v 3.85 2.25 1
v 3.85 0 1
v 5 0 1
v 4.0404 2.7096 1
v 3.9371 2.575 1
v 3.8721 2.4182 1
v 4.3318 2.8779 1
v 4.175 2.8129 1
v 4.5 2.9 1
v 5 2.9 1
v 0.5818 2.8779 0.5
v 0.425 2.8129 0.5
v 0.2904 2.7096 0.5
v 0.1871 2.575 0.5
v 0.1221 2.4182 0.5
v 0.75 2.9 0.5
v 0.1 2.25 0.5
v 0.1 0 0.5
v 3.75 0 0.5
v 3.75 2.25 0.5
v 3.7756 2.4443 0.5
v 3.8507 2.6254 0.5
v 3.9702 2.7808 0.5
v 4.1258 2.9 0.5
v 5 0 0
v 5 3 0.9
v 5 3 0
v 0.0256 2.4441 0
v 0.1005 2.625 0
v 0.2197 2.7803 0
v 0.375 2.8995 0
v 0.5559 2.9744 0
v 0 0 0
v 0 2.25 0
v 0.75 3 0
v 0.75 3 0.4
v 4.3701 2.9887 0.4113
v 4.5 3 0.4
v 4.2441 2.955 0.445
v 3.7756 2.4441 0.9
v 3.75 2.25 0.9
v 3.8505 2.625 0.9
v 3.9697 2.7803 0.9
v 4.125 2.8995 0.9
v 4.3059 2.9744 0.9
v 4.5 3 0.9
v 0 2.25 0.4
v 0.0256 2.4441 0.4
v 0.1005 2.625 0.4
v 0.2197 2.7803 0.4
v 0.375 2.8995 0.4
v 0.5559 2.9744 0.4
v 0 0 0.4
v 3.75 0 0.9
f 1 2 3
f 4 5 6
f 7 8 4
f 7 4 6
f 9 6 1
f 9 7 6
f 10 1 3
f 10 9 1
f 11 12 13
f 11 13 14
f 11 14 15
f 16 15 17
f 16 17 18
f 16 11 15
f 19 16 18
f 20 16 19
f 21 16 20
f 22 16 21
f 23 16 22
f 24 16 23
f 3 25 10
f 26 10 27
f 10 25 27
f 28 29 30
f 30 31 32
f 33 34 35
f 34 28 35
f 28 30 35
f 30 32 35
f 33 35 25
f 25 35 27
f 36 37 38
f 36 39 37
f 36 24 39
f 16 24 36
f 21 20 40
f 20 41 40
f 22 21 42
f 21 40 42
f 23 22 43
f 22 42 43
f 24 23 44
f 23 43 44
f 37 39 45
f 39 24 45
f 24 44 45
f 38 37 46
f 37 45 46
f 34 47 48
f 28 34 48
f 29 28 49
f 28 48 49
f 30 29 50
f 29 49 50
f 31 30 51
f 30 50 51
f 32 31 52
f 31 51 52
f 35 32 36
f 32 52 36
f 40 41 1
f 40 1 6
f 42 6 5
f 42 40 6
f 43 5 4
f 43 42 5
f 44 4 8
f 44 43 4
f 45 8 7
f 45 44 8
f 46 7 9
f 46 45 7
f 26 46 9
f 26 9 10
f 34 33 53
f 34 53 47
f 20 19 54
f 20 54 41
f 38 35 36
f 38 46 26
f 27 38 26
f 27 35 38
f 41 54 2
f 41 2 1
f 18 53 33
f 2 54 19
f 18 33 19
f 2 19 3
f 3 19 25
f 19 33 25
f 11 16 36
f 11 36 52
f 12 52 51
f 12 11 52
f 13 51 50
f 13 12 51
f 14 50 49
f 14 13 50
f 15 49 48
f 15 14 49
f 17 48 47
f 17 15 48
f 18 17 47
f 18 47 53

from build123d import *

# Parameters (mm, degrees)
SKETCH1_W           = 5
SKETCH1_H           = 3
BOSS_EXTRUDE1_DEPTH = 0.5
SKETCH2_W           = 1.25
SKETCH2_H           = 3
BOSS_EXTRUDE3_DEPTH = 0.5
FILLET1_R           = 0.75
CHAMFER1_SIZE       = 0.1


with BuildPart() as part:
    # Sketch1 → Boss-Extrude1 (new body)
    with BuildSketch(Plane.XY):
        with Locations((2.5, 1.5)):
            Rectangle(SKETCH1_W, SKETCH1_H)
    extrude(amount=BOSS_EXTRUDE1_DEPTH)

    # Sketch2 → Boss-Extrude3 (add)
    with BuildSketch(Plane.XY.offset(0.5)):
        with Locations((4.375, 1.5)):
            Rectangle(SKETCH2_W, SKETCH2_H)
    extrude(amount=BOSS_EXTRUDE3_DEPTH)

    # Fillet1
    fillet1_edges = [part.edges().sort_by_distance(p)[0] for p in [
        (3.75, 3, 0.75),
        (0, 3, 0.25),
    ]]
    fillet(fillet1_edges, radius=FILLET1_R)

    # Chamfer1
    chamfer1_edges = [part.edges().sort_by_distance(p)[0] for p in [
        (2.625, 3, 0.5),
        (4.75, 3, 1),
        (3.75, 1.125, 1),
        (3.969669914, 2.780330086, 1),
        (0, 1.125, 0.5),
        (0.219669914, 2.780330086, 0.5),
    ]]
    chamfer(chamfer1_edges, length=CHAMFER1_SIZE)


solid = part.part
